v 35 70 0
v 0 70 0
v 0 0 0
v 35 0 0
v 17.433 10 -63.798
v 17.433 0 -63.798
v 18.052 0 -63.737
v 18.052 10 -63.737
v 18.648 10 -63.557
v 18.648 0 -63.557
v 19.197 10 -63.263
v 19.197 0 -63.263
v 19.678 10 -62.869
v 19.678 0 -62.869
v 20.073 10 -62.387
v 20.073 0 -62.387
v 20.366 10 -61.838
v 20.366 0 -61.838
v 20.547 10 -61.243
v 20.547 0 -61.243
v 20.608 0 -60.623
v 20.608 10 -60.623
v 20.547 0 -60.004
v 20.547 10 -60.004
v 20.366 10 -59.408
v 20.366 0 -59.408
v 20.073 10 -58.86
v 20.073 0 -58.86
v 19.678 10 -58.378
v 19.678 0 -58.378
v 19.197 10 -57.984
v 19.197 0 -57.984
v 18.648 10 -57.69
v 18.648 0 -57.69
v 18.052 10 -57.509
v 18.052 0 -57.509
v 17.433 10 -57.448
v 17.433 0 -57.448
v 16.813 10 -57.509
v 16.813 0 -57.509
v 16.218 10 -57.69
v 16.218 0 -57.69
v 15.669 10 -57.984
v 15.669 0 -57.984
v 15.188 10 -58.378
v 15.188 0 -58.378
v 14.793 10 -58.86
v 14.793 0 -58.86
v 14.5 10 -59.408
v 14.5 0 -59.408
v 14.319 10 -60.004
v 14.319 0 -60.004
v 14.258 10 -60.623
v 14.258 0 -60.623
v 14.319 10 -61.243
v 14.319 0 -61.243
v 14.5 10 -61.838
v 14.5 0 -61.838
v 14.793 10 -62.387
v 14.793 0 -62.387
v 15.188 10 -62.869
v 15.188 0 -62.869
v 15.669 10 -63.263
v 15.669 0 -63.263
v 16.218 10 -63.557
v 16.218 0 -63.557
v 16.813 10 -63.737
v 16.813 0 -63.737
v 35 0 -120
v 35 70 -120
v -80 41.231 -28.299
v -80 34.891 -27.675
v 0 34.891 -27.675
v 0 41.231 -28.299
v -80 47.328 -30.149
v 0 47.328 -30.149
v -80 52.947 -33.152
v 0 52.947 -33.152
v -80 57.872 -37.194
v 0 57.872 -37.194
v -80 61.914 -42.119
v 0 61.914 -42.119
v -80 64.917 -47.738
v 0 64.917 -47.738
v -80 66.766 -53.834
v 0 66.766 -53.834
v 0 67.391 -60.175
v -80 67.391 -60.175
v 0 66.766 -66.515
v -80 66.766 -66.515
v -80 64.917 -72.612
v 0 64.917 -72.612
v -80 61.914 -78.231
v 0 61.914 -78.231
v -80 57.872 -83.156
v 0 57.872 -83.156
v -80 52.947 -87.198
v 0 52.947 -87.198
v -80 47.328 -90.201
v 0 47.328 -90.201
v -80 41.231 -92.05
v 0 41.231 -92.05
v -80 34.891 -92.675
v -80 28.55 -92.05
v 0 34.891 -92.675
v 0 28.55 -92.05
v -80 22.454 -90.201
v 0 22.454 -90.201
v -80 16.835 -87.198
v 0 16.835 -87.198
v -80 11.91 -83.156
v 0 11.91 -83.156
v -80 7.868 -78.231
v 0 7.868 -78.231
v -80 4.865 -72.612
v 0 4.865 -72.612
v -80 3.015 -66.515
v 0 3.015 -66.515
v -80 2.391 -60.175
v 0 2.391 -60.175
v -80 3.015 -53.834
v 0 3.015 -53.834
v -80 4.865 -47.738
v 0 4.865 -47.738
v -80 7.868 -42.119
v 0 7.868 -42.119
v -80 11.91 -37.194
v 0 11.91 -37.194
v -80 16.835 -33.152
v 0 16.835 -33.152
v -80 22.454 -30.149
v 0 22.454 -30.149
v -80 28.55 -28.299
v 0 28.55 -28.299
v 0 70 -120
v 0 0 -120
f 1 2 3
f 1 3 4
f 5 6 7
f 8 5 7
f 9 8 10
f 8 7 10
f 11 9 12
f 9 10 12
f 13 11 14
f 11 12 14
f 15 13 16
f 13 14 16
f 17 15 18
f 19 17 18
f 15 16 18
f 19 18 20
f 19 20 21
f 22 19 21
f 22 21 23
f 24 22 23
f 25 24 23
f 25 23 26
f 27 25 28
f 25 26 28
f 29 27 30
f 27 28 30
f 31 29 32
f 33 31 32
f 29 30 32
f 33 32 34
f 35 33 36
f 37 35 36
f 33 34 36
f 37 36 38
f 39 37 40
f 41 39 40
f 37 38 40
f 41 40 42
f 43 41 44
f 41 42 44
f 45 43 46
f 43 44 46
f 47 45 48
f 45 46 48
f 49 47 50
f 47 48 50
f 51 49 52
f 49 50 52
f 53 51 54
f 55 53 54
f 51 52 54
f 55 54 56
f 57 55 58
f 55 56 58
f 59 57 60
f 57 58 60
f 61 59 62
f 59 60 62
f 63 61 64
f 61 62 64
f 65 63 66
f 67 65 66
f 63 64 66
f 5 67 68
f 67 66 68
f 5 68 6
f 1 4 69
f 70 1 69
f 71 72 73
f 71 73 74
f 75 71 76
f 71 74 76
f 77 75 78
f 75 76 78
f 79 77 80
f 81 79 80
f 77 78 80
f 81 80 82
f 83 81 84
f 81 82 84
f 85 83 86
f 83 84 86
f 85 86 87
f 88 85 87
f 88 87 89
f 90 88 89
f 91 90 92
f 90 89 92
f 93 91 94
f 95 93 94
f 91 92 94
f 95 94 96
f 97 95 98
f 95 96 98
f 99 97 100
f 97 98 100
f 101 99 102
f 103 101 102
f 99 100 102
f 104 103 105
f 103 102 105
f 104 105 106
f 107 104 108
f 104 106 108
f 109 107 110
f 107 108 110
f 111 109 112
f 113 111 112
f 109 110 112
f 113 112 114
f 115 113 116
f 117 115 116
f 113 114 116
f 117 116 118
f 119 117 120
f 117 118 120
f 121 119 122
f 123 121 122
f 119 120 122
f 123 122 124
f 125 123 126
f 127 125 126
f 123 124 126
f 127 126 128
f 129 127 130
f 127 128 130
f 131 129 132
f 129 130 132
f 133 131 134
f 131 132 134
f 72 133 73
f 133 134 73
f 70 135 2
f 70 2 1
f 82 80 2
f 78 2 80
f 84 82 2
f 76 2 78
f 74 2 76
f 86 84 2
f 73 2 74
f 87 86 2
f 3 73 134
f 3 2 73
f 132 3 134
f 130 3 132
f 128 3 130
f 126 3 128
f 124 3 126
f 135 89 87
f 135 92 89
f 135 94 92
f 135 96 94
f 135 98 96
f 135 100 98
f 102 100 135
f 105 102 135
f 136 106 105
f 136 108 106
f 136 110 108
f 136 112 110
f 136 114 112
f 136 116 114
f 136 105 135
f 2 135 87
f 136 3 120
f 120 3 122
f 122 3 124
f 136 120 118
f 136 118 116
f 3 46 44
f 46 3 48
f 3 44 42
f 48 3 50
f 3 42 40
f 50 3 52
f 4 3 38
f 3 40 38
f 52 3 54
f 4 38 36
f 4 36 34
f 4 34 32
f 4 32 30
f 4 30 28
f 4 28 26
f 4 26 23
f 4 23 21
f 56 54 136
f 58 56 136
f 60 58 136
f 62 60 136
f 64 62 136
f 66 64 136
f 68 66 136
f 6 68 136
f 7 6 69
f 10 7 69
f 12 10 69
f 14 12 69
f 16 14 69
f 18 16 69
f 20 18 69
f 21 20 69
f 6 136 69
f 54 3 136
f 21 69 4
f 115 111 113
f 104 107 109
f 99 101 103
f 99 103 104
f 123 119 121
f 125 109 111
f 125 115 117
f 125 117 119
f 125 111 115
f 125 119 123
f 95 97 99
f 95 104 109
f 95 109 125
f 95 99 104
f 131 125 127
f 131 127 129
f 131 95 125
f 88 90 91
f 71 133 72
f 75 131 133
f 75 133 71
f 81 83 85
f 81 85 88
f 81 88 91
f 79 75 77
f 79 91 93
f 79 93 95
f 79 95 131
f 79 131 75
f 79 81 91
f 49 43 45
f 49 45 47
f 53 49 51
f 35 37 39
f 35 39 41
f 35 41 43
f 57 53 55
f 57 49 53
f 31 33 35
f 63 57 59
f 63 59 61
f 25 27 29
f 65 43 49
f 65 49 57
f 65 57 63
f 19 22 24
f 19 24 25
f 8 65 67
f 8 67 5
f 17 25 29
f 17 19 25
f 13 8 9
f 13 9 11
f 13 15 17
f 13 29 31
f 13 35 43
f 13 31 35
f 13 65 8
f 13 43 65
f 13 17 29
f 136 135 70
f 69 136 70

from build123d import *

# Parameters (mm, degrees)
SKETCH1_W           = 35
SKETCH1_H           = 120
BOSS_EXTRUDE1_DEPTH = 70
SKETCH2_R           = 32.5
BOSS_EXTRUDE2_DEPTH = 80
SKETCH3_R           = 3.175
CUT_EXTRUDE1_DEPTH  = 10


with BuildPart() as part:
    # Sketch1 → Boss-Extrude1 (new body)
    with BuildSketch(Plane(origin=(0, 0, 0), x_dir=(1, 0, 0), z_dir=(0, 1, 0))):
        with Locations((17.5, 60)):
            Rectangle(SKETCH1_W, SKETCH1_H)
    extrude(amount=BOSS_EXTRUDE1_DEPTH)

    # Sketch2 → Boss-Extrude2 (add)
    with BuildSketch(Plane.ZY):
        with Locations((-60.174932569, 34.890792619)):
            Circle(SKETCH2_R)
    extrude(amount=BOSS_EXTRUDE2_DEPTH)

    # Sketch3 → Cut-Extrude1 (cut)
    with BuildSketch(Plane.XZ):
        with Locations(Location((17.432872718, -60.623445189, 0), (0, 0, 270))):
            Circle(SKETCH3_R)
    extrude(amount=-CUT_EXTRUDE1_DEPTH, mode=Mode.SUBTRACT)


solid = part.part
